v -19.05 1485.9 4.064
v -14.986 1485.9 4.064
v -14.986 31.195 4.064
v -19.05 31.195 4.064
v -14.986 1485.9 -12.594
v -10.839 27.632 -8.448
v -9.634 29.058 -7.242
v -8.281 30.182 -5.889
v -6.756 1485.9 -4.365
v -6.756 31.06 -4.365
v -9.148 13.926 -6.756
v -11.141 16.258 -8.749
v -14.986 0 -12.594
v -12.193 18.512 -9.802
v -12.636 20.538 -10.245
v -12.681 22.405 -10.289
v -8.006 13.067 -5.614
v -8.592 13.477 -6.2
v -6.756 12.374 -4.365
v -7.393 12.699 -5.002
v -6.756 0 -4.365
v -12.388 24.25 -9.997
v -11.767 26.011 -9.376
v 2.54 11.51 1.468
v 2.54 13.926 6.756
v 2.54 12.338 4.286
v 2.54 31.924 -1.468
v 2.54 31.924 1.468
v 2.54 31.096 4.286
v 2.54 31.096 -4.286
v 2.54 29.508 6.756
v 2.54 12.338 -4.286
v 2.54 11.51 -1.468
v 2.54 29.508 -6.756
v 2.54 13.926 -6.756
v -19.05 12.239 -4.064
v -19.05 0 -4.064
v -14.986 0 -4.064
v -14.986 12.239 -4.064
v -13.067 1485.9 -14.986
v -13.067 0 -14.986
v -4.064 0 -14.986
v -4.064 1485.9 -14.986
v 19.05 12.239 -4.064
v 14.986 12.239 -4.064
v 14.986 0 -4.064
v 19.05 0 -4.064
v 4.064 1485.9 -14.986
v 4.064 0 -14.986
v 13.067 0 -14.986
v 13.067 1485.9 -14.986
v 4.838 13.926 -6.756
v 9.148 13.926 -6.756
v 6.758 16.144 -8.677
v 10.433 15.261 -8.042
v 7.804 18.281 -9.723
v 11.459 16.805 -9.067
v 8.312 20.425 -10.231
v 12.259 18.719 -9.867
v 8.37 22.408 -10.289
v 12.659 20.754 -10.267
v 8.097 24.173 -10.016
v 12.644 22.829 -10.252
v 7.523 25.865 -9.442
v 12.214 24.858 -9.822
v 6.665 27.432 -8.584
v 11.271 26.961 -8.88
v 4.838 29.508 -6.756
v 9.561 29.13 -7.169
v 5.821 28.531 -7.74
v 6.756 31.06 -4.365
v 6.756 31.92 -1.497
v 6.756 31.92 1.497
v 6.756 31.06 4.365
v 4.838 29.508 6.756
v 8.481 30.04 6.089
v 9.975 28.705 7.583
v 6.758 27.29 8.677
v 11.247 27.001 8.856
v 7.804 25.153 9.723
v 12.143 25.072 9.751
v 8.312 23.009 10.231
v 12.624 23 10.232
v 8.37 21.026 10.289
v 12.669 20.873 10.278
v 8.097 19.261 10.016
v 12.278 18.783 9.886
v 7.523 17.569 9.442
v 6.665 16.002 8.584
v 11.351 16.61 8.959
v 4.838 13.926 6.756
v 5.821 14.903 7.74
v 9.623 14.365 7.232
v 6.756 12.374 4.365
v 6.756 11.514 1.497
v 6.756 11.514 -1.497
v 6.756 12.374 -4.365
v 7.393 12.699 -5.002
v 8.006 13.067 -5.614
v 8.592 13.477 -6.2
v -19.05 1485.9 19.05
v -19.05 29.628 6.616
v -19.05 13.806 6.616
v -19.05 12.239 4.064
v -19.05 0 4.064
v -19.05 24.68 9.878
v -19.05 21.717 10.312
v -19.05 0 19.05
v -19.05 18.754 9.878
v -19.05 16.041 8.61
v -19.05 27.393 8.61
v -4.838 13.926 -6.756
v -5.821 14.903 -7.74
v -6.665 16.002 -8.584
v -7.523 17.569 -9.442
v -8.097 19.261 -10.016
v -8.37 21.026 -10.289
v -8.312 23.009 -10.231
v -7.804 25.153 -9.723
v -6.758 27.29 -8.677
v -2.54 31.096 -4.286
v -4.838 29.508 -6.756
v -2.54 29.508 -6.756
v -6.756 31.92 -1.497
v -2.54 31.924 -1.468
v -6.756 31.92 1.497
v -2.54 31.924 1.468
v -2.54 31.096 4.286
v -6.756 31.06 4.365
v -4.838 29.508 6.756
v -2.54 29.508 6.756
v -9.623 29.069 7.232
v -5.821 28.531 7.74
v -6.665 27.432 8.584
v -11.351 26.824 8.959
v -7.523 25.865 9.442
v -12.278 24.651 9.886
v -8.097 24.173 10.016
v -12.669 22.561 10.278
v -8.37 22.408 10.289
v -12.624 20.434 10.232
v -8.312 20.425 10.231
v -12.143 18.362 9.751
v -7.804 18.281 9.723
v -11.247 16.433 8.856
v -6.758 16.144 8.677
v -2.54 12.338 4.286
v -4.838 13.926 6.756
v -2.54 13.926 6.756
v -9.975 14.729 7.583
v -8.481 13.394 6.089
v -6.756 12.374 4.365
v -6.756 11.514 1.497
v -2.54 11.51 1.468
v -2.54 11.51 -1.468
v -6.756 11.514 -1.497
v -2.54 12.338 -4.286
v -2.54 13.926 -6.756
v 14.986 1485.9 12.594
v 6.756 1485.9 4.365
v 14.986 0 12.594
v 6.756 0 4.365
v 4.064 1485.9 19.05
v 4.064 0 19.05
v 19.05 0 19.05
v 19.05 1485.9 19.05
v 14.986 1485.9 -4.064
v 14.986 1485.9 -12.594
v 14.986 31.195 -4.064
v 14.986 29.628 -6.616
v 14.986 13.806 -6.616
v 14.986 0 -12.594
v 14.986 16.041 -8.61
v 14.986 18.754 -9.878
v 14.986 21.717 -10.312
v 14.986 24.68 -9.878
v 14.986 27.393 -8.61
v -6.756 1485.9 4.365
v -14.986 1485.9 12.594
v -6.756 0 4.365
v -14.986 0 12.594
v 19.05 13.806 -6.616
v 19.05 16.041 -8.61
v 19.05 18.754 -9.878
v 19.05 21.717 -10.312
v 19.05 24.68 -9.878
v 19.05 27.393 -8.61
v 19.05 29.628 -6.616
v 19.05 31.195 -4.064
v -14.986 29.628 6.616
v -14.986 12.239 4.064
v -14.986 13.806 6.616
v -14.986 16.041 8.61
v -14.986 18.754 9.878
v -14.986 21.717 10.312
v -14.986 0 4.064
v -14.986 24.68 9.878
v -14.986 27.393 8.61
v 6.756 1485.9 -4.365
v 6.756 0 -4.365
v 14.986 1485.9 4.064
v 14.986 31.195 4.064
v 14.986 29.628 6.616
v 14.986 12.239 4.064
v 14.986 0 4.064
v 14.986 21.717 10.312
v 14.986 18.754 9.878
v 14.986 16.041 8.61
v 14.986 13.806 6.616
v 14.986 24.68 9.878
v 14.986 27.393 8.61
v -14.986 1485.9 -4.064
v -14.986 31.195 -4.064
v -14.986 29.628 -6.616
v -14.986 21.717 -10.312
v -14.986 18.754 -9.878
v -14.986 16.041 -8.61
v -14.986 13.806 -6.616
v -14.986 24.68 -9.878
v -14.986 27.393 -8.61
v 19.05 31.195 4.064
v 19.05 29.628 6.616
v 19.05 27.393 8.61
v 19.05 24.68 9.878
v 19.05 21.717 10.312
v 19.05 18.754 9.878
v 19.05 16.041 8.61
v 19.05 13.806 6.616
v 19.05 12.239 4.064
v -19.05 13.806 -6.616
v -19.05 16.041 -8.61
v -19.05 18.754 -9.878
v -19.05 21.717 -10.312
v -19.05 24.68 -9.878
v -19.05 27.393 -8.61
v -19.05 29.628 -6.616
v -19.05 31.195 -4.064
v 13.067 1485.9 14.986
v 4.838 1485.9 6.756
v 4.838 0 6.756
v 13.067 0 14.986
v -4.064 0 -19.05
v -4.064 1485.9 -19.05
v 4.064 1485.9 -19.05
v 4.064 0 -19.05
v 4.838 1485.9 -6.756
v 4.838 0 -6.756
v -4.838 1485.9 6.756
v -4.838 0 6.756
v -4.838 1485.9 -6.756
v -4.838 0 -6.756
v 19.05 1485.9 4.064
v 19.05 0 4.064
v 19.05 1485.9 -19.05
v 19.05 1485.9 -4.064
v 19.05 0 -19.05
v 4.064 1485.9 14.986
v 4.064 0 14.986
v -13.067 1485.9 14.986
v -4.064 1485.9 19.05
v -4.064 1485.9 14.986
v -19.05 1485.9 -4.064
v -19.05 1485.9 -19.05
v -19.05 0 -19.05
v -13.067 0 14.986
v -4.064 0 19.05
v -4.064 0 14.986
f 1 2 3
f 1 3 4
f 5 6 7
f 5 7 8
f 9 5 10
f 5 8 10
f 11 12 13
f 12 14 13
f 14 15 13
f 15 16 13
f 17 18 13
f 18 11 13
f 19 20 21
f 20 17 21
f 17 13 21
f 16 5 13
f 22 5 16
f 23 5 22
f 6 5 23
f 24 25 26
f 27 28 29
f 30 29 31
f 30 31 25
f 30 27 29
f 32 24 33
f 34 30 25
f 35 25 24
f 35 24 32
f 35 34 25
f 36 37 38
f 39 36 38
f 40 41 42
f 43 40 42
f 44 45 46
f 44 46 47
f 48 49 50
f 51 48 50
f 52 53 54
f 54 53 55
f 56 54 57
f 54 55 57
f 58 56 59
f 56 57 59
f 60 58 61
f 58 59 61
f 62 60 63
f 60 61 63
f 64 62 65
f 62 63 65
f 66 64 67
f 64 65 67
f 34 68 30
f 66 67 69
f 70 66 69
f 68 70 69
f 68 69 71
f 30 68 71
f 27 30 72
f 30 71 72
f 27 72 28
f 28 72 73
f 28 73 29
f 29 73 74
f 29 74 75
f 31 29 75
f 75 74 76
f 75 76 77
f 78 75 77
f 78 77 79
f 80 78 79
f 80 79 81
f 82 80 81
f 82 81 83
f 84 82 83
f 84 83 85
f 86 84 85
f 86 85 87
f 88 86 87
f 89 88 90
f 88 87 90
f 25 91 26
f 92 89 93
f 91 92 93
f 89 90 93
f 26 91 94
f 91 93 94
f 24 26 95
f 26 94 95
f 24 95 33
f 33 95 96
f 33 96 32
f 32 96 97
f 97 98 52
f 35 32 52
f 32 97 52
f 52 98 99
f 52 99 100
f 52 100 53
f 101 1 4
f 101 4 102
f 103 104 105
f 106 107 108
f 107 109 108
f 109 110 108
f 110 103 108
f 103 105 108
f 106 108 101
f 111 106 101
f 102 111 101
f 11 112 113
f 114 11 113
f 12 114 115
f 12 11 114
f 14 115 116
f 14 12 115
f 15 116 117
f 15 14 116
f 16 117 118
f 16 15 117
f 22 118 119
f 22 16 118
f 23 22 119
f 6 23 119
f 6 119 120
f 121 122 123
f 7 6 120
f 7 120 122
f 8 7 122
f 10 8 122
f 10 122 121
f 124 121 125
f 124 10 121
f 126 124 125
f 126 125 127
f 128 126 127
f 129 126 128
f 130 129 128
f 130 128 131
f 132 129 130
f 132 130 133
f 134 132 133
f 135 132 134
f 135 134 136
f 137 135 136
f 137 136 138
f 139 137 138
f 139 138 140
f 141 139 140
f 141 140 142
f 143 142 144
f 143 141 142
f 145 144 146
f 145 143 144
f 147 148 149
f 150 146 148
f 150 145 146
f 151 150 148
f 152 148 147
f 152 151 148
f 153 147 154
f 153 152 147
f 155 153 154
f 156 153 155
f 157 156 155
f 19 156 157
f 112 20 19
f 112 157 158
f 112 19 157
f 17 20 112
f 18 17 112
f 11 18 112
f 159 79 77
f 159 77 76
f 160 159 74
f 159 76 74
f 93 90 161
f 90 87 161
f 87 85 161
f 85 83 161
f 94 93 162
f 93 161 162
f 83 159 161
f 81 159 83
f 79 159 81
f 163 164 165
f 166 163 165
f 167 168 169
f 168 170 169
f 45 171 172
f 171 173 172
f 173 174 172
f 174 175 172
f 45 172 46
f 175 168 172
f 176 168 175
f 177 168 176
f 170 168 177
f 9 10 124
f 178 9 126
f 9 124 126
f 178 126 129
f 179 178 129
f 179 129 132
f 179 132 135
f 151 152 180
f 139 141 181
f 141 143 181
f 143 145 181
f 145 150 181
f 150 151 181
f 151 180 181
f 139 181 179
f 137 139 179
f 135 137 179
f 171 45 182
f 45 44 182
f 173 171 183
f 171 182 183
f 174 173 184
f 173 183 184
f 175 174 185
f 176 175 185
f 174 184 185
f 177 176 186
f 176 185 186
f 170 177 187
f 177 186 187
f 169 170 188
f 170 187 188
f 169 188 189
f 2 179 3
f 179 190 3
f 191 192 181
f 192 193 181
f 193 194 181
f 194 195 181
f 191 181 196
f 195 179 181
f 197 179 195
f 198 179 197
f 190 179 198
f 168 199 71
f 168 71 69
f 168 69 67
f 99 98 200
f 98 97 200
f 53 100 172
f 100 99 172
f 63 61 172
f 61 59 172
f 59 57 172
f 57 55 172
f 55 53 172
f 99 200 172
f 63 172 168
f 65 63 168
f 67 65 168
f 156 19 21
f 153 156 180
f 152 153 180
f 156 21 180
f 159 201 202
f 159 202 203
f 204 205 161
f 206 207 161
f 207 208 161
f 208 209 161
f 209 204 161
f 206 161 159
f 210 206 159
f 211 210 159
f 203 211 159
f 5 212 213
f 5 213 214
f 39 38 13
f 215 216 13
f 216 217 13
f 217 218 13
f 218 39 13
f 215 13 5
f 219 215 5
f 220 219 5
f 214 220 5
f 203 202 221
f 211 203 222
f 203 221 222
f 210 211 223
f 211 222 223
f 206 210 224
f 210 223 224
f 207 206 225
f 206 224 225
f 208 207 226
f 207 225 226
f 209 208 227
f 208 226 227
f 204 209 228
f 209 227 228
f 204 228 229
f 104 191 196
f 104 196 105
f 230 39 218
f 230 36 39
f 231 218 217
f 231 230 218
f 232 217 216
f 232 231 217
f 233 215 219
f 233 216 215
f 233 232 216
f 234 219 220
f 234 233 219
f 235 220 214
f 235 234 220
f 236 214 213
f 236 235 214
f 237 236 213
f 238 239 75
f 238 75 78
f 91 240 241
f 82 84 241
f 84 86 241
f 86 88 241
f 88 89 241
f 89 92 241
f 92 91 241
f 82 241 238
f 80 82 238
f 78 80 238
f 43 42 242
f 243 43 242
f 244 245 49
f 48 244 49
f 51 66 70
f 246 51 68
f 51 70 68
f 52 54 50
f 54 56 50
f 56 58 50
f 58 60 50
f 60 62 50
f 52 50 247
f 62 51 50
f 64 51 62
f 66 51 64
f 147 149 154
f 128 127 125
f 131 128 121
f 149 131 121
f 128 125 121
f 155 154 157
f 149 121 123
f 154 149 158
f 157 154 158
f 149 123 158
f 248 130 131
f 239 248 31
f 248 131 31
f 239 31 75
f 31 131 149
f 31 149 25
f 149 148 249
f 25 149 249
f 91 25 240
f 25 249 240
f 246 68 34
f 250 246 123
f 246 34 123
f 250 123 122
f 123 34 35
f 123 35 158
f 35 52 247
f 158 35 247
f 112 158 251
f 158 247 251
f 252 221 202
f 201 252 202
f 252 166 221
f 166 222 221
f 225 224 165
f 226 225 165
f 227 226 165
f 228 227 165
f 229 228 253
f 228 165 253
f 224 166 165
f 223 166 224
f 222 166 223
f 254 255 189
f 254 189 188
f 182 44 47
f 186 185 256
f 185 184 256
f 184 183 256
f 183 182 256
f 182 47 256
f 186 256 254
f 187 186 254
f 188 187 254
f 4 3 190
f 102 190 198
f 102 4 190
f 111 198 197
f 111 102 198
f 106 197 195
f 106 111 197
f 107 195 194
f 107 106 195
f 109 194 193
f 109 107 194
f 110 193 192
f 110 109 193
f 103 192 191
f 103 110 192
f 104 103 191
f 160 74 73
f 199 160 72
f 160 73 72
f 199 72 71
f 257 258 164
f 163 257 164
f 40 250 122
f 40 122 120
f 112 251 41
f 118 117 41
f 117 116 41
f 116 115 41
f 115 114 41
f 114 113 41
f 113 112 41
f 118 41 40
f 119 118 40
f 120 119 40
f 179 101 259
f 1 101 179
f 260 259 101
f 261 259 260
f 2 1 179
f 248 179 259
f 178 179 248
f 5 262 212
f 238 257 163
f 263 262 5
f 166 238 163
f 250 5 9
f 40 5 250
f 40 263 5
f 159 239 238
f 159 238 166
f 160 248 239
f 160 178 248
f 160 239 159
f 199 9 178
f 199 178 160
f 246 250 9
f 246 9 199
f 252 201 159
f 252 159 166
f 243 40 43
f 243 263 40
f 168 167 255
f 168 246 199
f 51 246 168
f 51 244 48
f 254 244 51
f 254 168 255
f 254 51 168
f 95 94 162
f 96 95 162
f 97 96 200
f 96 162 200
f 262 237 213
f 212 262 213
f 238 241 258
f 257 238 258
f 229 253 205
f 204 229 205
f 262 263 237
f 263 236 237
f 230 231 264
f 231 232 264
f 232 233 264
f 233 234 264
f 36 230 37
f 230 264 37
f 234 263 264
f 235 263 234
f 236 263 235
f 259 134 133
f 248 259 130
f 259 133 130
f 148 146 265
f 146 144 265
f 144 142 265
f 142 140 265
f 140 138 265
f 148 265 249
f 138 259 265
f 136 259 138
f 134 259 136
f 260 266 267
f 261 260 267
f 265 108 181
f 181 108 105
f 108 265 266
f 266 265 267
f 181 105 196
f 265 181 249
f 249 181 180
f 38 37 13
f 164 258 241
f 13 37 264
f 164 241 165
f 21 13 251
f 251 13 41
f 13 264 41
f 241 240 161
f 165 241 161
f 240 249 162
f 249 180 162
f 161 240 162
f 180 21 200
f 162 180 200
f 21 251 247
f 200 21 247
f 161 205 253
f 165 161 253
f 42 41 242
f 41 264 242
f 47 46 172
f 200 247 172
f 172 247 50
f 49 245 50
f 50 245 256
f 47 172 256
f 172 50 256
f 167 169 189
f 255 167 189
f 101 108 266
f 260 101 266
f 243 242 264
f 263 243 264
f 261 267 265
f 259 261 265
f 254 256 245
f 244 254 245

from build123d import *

# Parameters (mm, degrees)
EXTRUDE1_DEPTH = 1485.9
SKETCH2_R      = 10.3124
EXTRUDE2_DEPTH = 16.51


# Read off the part's stored shape, not the designer's step: 1515<1>
with BuildPart() as part:
    # Sketch1<2> → Extrude1 (new body)
    with BuildSketch(Plane(origin=(0, 0, 0), x_dir=(1, 0, 0), z_dir=(0, 1, 0))):
        Polygon((-6.7564, 4.364749804), (-6.7564, -4.364749804), (-14.986, -12.594349804), (-14.986, -4.064), (-19.05, -4.064), (-19.05, -19.05), (-4.064, -19.05), (-4.064, -14.986), (-13.067127258, -14.986), (-4.837527258, -6.7564), (4.837527258, -6.7564), (13.067127258, -14.986), (4.064, -14.986), (4.064, -19.05), (19.05, -19.05), (19.05, -4.064), (14.986, -4.064), (14.986, -12.594349804), (6.7564, -4.364749804), (6.7564, 4.364749804), (14.986, 12.594349804), (14.986, 4.064), (19.05, 4.064), (19.05, 19.05), (4.064, 19.05), (4.064, 14.986), (13.067127258, 14.986), (4.837527258, 6.7564), (-4.837527258, 6.7564), (-13.067127258, 14.986), (-4.064, 14.986), (-4.064, 19.05), (-19.05, 19.05), (-19.05, 4.064), (-14.986, 4.064), (-14.986, 12.594349804), align=None)
    extrude(amount=EXTRUDE1_DEPTH)

    # Sketch2 → Extrude2 (cut)
    with BuildSketch(Plane(origin=(19.05, 0, 0), x_dir=(0, 0, -1), z_dir=(1, 0, 0))):
        with Locations(Location((0, 21.717, 0), (0, 0, 310.932724574))):
            Circle(SKETCH2_R)
    extrude2 = extrude(amount=-EXTRUDE2_DEPTH, mode=Mode.SUBTRACT)

    # Mirror1: Extrude2 across plane
    add(extrude2.mirror(Plane(origin=(0, 0, 0), x_dir=(0, 0, 1), z_dir=(1, 0, 0))), mode=Mode.SUBTRACT)


solid = part.part
